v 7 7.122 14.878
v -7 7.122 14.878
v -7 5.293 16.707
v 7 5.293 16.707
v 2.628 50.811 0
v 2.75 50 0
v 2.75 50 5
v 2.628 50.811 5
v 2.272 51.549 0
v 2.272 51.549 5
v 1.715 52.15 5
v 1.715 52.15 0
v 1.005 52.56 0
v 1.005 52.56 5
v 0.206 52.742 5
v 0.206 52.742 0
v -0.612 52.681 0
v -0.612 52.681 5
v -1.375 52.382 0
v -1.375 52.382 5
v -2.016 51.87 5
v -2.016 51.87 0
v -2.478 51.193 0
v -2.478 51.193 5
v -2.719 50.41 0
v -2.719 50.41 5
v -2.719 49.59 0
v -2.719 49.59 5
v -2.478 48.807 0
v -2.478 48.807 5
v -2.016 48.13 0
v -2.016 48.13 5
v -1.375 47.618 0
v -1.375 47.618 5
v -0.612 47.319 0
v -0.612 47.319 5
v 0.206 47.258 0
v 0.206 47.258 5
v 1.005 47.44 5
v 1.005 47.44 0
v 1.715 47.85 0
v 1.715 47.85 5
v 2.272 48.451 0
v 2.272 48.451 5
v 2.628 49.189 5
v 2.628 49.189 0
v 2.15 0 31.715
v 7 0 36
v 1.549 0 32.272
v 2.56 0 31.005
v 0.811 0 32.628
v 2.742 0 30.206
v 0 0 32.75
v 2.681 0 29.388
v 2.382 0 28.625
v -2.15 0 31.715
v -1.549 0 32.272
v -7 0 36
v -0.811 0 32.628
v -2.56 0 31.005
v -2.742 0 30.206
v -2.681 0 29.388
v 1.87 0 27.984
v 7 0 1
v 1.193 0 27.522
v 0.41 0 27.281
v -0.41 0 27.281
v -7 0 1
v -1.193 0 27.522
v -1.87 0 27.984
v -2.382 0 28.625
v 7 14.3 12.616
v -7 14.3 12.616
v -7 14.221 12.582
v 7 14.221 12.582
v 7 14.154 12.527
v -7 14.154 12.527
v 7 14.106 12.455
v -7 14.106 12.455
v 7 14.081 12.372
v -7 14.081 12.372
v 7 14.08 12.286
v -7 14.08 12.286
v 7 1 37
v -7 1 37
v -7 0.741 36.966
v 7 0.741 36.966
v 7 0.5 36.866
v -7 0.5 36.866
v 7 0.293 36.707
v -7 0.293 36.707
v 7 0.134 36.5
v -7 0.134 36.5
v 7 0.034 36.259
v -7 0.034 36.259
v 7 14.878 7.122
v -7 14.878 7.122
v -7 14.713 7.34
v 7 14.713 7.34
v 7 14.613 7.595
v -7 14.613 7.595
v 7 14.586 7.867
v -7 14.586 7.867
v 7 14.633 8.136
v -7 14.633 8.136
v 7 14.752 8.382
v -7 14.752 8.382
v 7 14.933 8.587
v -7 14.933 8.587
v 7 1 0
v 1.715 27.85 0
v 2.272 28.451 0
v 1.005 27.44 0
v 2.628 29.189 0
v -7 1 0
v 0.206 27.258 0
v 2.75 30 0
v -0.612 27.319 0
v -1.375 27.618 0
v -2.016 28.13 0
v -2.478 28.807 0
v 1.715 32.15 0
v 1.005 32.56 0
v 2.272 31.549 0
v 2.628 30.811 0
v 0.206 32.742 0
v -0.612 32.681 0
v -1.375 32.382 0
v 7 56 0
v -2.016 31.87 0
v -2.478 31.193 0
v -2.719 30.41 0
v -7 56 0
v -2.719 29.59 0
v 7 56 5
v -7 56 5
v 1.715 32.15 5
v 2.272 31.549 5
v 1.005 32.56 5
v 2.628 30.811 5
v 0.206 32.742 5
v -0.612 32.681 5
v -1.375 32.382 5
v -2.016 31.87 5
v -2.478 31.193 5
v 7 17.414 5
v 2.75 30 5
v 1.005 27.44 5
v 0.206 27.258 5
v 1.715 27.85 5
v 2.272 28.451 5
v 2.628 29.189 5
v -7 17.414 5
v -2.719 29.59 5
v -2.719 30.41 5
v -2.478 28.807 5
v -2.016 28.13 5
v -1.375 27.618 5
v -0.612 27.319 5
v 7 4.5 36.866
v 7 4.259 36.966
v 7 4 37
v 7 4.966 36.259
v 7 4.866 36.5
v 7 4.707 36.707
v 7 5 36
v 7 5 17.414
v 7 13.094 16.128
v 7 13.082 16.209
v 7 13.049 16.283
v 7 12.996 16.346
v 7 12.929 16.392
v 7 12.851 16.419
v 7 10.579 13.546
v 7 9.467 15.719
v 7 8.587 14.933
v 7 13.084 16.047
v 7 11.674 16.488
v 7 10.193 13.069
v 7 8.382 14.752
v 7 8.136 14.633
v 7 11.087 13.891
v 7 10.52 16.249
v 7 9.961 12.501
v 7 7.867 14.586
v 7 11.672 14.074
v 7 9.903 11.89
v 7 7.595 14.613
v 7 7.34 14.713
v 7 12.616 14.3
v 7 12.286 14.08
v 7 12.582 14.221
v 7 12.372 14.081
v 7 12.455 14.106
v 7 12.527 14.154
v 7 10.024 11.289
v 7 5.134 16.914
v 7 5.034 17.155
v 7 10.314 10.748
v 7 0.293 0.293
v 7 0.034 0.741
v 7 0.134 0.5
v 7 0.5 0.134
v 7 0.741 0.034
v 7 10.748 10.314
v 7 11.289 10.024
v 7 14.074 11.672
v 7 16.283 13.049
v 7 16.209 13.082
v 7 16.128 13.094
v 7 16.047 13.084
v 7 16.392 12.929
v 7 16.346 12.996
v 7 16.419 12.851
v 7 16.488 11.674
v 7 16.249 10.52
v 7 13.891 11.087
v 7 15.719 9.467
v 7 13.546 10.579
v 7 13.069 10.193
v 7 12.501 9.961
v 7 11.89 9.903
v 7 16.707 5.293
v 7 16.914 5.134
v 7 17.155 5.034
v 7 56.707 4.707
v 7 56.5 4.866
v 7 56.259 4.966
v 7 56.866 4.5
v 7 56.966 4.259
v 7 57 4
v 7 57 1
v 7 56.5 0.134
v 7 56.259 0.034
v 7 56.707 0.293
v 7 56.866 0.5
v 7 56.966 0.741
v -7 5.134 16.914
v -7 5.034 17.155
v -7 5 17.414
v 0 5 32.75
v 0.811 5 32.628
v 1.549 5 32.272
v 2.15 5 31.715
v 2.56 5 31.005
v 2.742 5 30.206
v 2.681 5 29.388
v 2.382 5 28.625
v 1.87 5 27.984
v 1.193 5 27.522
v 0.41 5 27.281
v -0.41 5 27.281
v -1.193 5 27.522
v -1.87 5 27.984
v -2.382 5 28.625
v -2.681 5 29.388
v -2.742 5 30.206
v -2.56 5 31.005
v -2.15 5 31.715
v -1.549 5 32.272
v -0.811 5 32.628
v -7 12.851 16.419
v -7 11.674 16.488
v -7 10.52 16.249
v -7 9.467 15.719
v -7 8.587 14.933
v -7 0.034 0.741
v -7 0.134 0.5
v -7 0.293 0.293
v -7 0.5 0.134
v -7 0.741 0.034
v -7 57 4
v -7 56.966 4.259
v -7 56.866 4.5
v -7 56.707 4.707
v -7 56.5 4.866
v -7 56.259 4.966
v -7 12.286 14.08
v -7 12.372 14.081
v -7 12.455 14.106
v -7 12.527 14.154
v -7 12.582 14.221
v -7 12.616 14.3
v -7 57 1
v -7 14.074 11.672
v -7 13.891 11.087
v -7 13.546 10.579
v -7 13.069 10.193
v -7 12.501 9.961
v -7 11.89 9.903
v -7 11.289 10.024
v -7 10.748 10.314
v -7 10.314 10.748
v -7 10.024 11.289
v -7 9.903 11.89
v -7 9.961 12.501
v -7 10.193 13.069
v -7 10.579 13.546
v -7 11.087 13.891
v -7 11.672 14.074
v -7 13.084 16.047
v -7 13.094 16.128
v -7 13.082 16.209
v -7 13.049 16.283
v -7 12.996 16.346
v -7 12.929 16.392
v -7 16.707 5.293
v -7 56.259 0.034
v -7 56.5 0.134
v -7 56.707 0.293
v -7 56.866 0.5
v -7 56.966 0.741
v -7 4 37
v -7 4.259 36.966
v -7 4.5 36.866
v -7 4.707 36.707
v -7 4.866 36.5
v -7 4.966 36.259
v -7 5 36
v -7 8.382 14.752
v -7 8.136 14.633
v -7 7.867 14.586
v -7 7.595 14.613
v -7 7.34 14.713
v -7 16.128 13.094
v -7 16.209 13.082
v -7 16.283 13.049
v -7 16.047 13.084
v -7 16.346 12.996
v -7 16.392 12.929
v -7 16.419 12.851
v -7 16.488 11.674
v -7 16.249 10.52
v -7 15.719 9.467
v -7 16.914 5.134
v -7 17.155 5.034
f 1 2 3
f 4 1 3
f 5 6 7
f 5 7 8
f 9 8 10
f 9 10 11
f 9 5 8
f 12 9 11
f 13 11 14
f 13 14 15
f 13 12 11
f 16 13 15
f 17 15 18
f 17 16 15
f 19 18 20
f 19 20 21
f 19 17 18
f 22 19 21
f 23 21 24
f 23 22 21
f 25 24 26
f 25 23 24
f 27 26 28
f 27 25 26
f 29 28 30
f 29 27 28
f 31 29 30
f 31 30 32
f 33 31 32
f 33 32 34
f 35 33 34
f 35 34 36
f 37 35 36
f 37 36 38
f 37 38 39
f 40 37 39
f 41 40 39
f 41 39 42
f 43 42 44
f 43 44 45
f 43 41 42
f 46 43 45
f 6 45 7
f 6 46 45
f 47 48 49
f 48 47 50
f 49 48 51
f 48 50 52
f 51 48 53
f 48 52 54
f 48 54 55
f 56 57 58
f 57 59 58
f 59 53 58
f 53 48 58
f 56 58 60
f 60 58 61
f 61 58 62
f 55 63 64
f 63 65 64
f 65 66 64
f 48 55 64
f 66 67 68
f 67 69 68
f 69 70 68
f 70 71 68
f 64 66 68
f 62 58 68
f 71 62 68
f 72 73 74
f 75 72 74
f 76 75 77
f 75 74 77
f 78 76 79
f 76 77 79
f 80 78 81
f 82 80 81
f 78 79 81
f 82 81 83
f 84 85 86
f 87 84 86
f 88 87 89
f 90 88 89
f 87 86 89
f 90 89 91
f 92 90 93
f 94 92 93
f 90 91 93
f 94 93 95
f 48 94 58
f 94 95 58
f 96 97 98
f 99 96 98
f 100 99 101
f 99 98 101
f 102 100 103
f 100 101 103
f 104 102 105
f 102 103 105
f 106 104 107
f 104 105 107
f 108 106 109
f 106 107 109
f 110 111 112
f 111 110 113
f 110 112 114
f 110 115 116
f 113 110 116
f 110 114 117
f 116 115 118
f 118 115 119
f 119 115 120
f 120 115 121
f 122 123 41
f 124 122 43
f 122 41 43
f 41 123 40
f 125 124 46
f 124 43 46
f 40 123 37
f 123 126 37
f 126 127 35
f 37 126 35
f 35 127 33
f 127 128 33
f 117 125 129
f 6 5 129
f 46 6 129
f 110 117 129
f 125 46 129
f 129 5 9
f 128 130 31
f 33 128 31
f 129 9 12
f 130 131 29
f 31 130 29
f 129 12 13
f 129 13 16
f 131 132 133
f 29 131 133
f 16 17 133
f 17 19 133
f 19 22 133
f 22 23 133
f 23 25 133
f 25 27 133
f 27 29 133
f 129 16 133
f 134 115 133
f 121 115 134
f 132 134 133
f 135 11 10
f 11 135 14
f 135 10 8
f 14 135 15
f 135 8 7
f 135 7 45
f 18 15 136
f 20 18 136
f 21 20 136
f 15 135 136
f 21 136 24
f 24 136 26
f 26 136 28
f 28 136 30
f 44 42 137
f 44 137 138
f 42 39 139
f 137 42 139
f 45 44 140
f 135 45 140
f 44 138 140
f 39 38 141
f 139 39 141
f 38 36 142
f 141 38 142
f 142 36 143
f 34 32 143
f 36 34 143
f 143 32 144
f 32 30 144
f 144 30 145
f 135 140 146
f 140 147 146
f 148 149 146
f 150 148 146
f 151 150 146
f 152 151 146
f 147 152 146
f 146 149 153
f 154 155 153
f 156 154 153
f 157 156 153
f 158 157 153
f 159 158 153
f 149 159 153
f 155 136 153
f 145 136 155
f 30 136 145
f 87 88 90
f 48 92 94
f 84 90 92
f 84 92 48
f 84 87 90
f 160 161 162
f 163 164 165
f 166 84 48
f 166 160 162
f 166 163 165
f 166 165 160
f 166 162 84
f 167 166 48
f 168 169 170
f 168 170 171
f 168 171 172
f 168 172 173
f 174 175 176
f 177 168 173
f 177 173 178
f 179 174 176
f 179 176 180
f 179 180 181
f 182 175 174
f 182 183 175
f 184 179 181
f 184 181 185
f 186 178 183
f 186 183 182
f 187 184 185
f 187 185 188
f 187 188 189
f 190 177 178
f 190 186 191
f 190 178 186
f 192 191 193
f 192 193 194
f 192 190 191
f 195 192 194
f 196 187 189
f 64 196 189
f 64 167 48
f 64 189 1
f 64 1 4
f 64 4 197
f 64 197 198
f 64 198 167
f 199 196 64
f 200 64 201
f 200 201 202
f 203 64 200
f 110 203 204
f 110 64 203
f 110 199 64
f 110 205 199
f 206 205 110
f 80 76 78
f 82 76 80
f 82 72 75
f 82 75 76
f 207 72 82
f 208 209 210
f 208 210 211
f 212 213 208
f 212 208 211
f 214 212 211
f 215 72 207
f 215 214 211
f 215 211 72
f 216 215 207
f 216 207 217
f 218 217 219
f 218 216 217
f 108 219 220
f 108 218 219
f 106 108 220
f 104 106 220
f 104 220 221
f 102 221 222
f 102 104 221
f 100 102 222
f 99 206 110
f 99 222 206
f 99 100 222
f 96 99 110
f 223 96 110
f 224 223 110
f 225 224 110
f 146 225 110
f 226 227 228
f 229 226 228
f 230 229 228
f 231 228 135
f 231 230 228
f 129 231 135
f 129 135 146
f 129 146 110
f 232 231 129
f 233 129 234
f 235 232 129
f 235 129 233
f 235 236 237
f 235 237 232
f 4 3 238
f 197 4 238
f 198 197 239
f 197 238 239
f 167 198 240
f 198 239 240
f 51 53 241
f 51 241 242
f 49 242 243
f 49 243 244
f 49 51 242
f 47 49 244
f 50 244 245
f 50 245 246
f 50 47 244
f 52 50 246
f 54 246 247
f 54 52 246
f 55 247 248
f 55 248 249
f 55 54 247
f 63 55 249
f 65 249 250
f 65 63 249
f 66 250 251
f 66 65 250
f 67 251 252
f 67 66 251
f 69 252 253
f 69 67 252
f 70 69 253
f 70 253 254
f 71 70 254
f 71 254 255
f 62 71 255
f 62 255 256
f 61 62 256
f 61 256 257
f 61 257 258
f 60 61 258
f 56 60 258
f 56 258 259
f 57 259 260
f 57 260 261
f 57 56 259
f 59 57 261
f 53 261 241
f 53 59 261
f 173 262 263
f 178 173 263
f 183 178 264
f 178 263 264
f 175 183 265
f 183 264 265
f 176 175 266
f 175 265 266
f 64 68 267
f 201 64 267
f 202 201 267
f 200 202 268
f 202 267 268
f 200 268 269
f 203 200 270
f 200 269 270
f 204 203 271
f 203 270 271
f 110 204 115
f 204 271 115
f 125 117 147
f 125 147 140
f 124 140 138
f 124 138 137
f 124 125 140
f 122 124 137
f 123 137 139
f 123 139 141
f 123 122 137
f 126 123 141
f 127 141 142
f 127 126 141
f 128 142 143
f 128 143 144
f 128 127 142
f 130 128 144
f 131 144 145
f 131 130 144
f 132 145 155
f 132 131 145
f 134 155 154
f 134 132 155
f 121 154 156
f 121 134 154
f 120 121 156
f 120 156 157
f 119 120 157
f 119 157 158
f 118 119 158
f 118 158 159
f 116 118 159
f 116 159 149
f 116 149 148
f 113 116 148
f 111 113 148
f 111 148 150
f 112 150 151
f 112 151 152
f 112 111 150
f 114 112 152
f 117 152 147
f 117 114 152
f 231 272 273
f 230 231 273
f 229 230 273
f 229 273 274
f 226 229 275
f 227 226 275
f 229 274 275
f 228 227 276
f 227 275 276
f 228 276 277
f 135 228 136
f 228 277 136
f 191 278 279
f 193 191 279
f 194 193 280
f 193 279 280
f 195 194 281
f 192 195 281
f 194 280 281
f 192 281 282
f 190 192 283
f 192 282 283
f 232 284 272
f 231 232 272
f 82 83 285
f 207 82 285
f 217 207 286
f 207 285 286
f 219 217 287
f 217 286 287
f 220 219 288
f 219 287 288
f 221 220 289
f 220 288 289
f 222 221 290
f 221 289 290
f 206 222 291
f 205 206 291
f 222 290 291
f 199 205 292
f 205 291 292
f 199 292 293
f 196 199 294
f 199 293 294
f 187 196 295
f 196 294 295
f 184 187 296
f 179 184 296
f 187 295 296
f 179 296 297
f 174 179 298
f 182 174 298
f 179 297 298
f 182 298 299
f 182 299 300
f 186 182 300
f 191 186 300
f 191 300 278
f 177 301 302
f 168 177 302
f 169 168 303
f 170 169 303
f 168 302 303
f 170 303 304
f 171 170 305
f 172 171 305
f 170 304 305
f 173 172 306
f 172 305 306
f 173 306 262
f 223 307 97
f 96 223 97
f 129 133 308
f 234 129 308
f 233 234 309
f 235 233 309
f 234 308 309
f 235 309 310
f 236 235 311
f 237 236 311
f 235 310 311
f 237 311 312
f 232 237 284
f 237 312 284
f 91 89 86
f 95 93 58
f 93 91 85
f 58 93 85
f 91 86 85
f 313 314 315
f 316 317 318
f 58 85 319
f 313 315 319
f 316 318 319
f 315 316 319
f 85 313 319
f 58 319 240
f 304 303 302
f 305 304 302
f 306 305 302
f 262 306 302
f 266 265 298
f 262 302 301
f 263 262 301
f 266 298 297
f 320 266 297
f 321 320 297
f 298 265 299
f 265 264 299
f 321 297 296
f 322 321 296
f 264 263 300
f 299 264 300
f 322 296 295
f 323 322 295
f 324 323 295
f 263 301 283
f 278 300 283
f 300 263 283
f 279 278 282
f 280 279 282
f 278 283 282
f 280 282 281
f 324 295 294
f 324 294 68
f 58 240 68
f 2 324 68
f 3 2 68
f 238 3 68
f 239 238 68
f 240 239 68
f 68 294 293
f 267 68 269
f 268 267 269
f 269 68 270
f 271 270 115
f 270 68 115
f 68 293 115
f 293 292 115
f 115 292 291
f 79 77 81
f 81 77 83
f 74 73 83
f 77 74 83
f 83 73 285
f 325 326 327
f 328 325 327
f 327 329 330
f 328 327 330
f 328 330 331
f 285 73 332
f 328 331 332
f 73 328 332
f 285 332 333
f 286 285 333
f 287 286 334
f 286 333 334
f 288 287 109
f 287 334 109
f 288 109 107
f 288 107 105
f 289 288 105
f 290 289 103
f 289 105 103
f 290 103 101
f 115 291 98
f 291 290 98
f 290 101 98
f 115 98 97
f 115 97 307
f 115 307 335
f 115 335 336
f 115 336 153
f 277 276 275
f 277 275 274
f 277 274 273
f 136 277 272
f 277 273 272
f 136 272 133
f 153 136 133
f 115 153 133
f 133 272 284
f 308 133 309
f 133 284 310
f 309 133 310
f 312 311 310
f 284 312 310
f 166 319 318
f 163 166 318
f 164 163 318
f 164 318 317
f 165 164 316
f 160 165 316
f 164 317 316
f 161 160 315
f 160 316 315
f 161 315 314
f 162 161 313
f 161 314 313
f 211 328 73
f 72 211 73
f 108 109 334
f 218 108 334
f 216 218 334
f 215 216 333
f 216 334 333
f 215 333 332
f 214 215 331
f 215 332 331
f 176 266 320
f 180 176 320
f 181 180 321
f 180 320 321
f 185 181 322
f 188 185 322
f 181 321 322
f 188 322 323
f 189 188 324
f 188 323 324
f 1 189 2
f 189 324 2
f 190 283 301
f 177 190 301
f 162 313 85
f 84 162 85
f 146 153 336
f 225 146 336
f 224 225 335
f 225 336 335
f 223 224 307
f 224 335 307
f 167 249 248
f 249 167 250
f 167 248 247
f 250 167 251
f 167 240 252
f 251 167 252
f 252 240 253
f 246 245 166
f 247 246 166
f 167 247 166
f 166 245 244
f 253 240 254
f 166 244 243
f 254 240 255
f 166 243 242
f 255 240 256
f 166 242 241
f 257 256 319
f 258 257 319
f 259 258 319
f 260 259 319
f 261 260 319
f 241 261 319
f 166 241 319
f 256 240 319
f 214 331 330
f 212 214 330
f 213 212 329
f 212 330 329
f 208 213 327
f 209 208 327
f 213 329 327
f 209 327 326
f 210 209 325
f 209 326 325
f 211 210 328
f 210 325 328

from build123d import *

# Parameters (mm, degrees)
BOSS_EXTRUDE1_DEPTH      = 7
BOSS_EXTRUDE1_DEPTH_BACK = 7
SKETCH2_R                = 2.75
CUT_EXTRUDE1_DEPTH       = 5
SKETCH3_R                = 2.75
CUT_EXTRUDE2_DEPTH       = 5
SKETCH4_R                = 2.75
CUT_EXTRUDE3_DEPTH       = 5


with BuildPart() as part:
    # Sketch1 → Boss-Extrude1 (new, two sides: drawn at the far end of the back side and taken through both)
    with BuildSketch(Plane(origin=(0, 0, 0), x_dir=(0, 0, -1), z_dir=(1, 0, 0)).offset(-BOSS_EXTRUDE1_DEPTH_BACK)):
        with BuildLine():
            Line((-36, 0), (-1, 0))
            ThreePointArc((-1, 0), (-0.292893219, 0.292893219), (0, 1))
            Line((0, 1), (0, 56))
            ThreePointArc((0, 56), (-0.292893219, 56.707106781), (-1, 57))
            Line((-1, 57), (-4, 57))
            ThreePointArc((-4, 57), (-4.707106781, 56.707106781), (-5, 56))
            Line((-5, 56), (-5, 17.414213562))
            ThreePointArc((-5, 17.414213562), (-5.076120467, 17.03153013), (-5.292893219, 16.707106781))
            Line((-5.292893219, 16.707106781), (-7.121957509, 14.878042491))
            ThreePointArc((-7.121957509, 14.878042491), (-7.866746852, 14.585859512), (-8.587416263, 14.93330398))
            ThreePointArc((-8.587416263, 14.93330398), (-10.519537583, 16.249497739), (-12.851234525, 16.418755456))
            ThreePointArc((-12.851234525, 16.418755456), (-13.048766707, 16.283360738), (-13.084263382, 16.046526031))
            Line((-13.084263382, 16.046526031), (-12.616293745, 14.300039569))
            ThreePointArc((-12.616293745, 14.300039569), (-12.492491512, 14.127781044), (-12.285701536, 14.080474617))
            ThreePointArc((-12.285701536, 14.080474617), (-10.515075746, 10.515075773), (-14.080474622, 12.285701498))
            ThreePointArc((-14.080474622, 12.285701498), (-14.127781033, 12.492491496), (-14.300039569, 12.616293745))
            Line((-14.300039569, 12.616293745), (-16.046526031, 13.084263382))
            ThreePointArc((-16.046526031, 13.084263382), (-16.283360688, 13.048766739), (-16.418755434, 12.851234641))
            ThreePointArc((-16.418755434, 12.851234641), (-16.249497766, 10.51953766), (-14.933304014, 8.587416292))
            ThreePointArc((-14.933304014, 8.587416292), (-14.585859513, 7.866746874), (-14.878042491, 7.121957509))
            Line((-14.878042491, 7.121957509), (-16.707106781, 5.292893219))
            ThreePointArc((-16.707106781, 5.292893219), (-17.03153013, 5.076120467), (-17.414213562, 5))
            Line((-17.414213562, 5), (-36, 5))
            ThreePointArc((-36, 5), (-36.707106781, 4.707106781), (-37, 4))
            Line((-37, 4), (-37, 1))
            ThreePointArc((-37, 1), (-36.707106781, 0.292893219), (-36, 0))
        make_face()
    extrude(amount=BOSS_EXTRUDE1_DEPTH + BOSS_EXTRUDE1_DEPTH_BACK)

    # Sketch2 → Cut-Extrude1 (cut)
    with BuildSketch(Plane.XY):
        with Locations((0, 30)):
            Circle(SKETCH2_R)
    extrude(amount=CUT_EXTRUDE1_DEPTH, mode=Mode.SUBTRACT)

    # Sketch3 → Cut-Extrude2 (cut)
    with BuildSketch(Plane.XY):
        with Locations((0, 50)):
            Circle(SKETCH3_R)
    extrude(amount=CUT_EXTRUDE2_DEPTH, mode=Mode.SUBTRACT)

    # Sketch4 → Cut-Extrude3 (cut)
    with BuildSketch(Plane(origin=(0, 0, 0), x_dir=(1, 0, 0), z_dir=(0, 1, 0))):
        with Locations((0, -30)):
            Circle(SKETCH4_R)
    extrude(amount=CUT_EXTRUDE3_DEPTH, mode=Mode.SUBTRACT)


solid = part.part
